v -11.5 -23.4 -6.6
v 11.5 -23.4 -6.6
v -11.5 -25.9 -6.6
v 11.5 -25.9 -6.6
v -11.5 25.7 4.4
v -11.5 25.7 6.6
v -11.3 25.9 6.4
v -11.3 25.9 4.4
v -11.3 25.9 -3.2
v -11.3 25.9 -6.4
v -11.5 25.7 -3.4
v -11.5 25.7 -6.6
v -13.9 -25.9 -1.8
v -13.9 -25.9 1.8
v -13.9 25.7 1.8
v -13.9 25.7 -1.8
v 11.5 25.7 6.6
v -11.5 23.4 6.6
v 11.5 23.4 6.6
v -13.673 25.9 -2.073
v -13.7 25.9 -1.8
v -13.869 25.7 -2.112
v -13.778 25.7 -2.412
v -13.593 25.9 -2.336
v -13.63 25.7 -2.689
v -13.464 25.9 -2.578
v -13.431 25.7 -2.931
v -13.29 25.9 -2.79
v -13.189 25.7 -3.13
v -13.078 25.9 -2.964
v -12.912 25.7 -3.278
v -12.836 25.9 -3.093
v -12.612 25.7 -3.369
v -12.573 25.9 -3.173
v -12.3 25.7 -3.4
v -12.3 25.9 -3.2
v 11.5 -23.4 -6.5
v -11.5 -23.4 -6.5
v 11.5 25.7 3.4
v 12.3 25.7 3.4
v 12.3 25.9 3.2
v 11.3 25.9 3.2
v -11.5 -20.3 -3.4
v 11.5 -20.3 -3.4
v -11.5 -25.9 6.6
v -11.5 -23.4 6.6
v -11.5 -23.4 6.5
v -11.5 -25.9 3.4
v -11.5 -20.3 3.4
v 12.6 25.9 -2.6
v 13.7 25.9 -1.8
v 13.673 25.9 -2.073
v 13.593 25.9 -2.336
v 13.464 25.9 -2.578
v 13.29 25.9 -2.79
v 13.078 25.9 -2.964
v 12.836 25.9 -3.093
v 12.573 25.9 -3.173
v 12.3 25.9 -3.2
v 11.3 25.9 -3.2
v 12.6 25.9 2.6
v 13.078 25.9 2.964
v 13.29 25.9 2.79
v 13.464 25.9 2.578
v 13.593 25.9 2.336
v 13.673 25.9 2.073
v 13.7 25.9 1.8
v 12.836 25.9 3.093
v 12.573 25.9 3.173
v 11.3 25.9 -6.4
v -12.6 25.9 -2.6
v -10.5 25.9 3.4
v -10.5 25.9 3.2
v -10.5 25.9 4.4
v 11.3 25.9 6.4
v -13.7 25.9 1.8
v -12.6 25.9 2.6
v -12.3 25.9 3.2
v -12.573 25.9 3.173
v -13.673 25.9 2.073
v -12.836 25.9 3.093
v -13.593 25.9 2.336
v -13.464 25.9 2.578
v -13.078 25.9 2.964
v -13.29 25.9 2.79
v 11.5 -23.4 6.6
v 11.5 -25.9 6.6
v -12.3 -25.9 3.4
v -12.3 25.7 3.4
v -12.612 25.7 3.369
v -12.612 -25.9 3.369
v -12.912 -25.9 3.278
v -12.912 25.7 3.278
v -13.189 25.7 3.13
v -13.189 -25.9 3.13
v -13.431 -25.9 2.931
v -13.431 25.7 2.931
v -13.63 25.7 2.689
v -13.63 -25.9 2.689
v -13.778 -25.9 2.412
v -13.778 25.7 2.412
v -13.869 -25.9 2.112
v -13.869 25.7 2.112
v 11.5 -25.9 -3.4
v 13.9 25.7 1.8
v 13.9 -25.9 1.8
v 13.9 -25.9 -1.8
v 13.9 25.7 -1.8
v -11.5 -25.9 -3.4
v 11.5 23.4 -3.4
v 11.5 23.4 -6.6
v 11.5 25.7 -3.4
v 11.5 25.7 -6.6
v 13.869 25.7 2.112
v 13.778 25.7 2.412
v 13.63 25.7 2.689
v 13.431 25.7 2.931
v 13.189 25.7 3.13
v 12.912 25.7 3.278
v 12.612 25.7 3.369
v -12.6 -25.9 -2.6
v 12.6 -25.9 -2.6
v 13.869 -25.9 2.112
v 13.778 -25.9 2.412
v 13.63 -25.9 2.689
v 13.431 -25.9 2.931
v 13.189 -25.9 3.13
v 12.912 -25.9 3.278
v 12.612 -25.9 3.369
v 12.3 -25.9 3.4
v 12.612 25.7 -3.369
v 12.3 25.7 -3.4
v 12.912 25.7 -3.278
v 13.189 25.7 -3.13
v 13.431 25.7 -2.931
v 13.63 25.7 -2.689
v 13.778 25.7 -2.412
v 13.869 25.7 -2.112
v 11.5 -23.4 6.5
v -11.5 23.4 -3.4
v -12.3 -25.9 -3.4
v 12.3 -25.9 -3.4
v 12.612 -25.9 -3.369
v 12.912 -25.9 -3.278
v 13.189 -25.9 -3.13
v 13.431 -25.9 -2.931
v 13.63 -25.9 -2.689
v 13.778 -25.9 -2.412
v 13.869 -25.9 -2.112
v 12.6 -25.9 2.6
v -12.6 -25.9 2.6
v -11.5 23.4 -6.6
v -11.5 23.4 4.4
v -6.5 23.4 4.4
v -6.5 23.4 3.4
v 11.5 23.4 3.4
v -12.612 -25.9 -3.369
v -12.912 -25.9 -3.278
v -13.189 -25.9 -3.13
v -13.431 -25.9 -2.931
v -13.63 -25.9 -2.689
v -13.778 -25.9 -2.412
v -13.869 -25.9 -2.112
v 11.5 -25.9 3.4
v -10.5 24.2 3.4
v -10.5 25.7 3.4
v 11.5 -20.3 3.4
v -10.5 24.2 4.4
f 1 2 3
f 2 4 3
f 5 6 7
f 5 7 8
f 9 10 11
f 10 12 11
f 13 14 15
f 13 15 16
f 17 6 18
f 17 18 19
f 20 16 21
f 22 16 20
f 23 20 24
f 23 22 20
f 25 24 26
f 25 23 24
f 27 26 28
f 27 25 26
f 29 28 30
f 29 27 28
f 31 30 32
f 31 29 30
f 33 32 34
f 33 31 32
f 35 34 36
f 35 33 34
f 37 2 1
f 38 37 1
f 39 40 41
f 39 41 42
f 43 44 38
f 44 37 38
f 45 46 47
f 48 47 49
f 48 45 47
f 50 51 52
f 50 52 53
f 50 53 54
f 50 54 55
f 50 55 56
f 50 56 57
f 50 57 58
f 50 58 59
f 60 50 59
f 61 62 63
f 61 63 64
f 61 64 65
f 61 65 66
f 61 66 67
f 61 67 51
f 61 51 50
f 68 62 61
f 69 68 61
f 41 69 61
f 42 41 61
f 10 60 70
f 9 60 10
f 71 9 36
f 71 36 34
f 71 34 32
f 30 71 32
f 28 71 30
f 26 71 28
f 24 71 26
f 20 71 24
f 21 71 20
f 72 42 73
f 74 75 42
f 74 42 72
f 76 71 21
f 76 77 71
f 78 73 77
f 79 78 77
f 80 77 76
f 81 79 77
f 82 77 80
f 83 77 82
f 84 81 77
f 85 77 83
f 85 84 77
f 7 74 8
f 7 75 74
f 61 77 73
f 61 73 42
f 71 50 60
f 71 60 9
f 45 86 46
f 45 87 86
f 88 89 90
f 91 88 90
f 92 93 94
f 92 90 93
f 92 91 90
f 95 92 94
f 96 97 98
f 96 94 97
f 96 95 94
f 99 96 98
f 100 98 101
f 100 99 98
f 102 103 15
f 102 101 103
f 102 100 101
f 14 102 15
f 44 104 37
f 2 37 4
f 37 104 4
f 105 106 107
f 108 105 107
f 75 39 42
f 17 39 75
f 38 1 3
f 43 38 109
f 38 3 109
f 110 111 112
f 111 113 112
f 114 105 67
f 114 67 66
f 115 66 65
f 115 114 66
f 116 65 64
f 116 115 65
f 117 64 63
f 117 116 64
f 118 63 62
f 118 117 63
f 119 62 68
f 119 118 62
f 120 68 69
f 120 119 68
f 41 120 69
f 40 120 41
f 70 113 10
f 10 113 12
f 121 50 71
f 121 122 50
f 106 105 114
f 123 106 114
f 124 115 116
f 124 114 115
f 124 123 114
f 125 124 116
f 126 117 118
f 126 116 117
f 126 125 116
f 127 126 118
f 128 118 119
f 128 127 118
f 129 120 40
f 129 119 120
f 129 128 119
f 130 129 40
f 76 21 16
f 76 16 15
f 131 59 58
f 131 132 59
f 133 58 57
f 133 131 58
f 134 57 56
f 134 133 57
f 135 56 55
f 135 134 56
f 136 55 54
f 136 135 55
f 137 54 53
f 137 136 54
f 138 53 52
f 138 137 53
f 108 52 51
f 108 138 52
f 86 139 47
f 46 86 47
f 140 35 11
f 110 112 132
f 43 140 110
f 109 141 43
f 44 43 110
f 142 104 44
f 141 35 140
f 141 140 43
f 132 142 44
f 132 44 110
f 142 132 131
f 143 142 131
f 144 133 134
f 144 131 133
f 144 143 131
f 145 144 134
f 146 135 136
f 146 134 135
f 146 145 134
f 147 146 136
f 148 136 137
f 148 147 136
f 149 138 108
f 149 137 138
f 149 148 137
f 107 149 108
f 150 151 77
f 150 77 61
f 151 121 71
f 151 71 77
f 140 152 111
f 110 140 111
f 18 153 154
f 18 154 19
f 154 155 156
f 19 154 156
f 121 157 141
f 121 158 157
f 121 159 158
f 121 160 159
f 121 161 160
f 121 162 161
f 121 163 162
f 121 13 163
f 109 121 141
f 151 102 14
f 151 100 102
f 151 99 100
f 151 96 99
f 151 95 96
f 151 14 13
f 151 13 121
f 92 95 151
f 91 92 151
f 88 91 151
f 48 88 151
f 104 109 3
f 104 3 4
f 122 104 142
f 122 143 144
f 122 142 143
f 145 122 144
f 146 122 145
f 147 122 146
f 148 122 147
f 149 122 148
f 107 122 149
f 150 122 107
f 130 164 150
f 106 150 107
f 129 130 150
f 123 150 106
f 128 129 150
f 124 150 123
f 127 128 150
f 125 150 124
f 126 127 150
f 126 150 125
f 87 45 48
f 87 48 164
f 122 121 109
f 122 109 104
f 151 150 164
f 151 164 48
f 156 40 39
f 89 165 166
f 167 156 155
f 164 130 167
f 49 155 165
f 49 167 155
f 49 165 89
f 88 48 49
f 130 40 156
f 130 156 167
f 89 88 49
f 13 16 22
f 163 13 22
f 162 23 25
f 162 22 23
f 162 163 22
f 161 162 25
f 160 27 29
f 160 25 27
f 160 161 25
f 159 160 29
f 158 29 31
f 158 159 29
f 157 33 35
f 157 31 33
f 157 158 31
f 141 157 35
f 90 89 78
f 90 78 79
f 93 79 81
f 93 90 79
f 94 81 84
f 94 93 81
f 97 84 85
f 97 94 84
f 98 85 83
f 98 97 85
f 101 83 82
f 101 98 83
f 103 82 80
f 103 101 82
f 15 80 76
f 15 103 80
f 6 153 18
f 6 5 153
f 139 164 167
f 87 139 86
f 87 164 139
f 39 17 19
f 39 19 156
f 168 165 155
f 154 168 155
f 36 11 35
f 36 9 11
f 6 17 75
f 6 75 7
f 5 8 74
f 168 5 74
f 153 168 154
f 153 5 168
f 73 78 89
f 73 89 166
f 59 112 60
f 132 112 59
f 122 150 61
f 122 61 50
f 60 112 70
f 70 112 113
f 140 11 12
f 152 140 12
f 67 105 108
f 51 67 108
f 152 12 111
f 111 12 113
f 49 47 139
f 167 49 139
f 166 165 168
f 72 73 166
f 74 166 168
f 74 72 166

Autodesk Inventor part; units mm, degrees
ref_plane "YZ Plane" through (0, 0, 0) normal (1, 0, 0) x (0, 1, 0)
ref_plane "XZ Plane" through (0, 0, 0) normal (0, 1, 0) x (-1, 0, 0)
ref_plane "XY Plane" through (0, 0, 0) normal (0, 0, 1) x (1, 0, 0)
sketch "Skizze2" plane through (0, 0, 0) normal (0, 1, 0) x (-1, 0, 0)
  line L0 (-12.6, -2.6) -> (12.6, -2.6)
  line L1 (12.6, -2.6) -> (12.6, 2.6)
  line L2 (12.6, 2.6) -> (-12.6, 2.6)
  line L3 (-12.6, 2.6) -> (-12.6, -2.6)
  line L4 (-12.6, -2.6) -> (12.6, 2.6) construction
  line L5 (12.6, -2.6) -> (-12.6, 2.6) construction
  line L6 (-12.3, 3.4) -> (12.3, 3.4)
  line L7 (12.3, -3.4) -> (-12.3, -3.4)
  line L8 (-19.9239, 0) -> (19.9239, 0) projected
  line L9 (0, -5.2239) -> (0, 5.2239) projected
  arc A0 (-12.3, 3.4) -> (-13.9, 1.8) centre (-12.3, 1.8) ccw
  arc A1 (-13.9, -1.8) -> (-12.3, -3.4) centre (-12.3, -1.8) ccw
  arc A2 (13.9, 1.8) -> (12.3, 3.4) centre (12.3, 1.8) ccw
  arc A3 (12.3, -3.4) -> (13.9, -1.8) centre (12.3, -1.8) ccw
  line L10 (-13.9, 1.8) -> (-13.9, -1.8)
  line L11 (13.9, 1.8) -> (13.9, -1.8)
  point P0 (0, 0)
  dimension "d0" = 25.2
  dimension "d1" = 5.2
  dimension "d2" = 0.8
  dimension "d29" = 3.2
  dimension "d32" = 1.3
extrude "Extrusion1" add sketch "Skizze2" along normal blind 25.9 contours L0 L9 L7 A1 L10 L8 L3 | L0 L1 L8 L11 A3 L7 L9 | L8 L10 A0 L6 L9 L2 L3 | L1 L2 L9 L6 A2 L11 L8
sketch "Skizze3" plane through (0, 25.9, 0) normal (0, 1, 0) x (1, 0, 0)
  line L0 (12.6, 2.6) -> (12.6, -2.6) projected
  line L1 (12.6, -2.6) -> (-12.6, -2.6) projected
  line L2 (-12.6, -2.6) -> (-12.6, 2.6) projected
  line L3 (-12.6, 2.6) -> (12.6, 2.6) projected
  line L4 (12.3, 3.4) -> (-12.3, 3.4) projected
  line L5 (-12.3, -3.4) -> (12.3, -3.4) projected
  line L6 (19.46, 0) -> (-19.46, 0) projected
  line L7 (11.5, -3.4) -> (-11.5, -3.4)
  line L8 (-11.5, -3.4) -> (-11.5, -6.6)
  line L9 (-11.5, -6.6) -> (11.5, -6.6)
  line L10 (11.5, -6.6) -> (11.5, -3.4)
  line L11 (12.3, 3.4) -> (-12.3, 3.4) projected
  line L12 (11.5, 3.4) -> (-11.5, 3.4)
  line L13 (-11.5, 3.4) -> (-11.5, 6.6)
  line L14 (-11.5, 6.6) -> (11.5, 6.6)
  line L15 (11.5, 6.6) -> (11.5, 3.4)
  line L16 (0, 9.24) -> (0, -9.24) projected
  line L17 (-12.3, -3.4) -> (12.3, -3.4) projected
  arc A0 (12.3, -3.4) -> (13.9, -1.8) centre (12.3, -1.8) ccw projected
  arc A1 (13.9, 1.8) -> (12.3, 3.4) centre (12.3, 1.8) ccw projected
  arc A2 (-12.3, 3.4) -> (-13.9, 1.8) centre (-12.3, 1.8) ccw projected
  arc A3 (-13.9, -1.8) -> (-12.3, -3.4) centre (-12.3, -1.8) ccw projected
  line L18 (13.9, -1.8) -> (13.9, 1.8) projected
  line L19 (-13.9, 1.8) -> (-13.9, -1.8) projected
  dimension "d18" = 3.2
  dimension "d19" = 23
extrude "Extrusion2" add sketch "Skizze3" against normal blind 2.5 contours L16 L14 L15 L4 | L4 L13 L14 L16 | L16 L9 L8 L5 | L5 L10 L9 L16
mirror "Spiegeln1" about plane through (0, 0, 0) normal (0, 1, 0) of "Extrusion1", "Extrusion2"
chamfer "Fase1" distance 3.1 angle 45 2 edges at (0, -23.4, 3.4) (0, -23.4, -3.4)
sketch "Skizze7" plane through (0, 23.4, 0) normal (0, -1, 0) x (1, 0, 0)
  line L0 (13.4387, -2.2) -> (13.6, -2.2) projected
  line L1 (13.6, 1.5) -> (13.6, 2.2) projected
  line L2 (13.6, 2.2) -> (13.4387, 2.2) projected
  line L3 (11.5, 3.4) -> (11.5, 6.6) projected
  line L4 (11.5, 6.6) -> (-11.5, 6.6) projected
  line L5 (-11.5, 6.6) -> (-11.5, 3.4) projected
  line L6 (11.5, 3.4) -> (-11.5, 3.4) projected
  line L7 (-11.5, -3.4) -> (11.5, -3.4) projected
  line L8 (-11.5, -3.4) -> (-11.5, -6.6) projected
  line L9 (-11.5, -6.6) -> (11.5, -6.6) projected
  line L10 (11.5, -6.6) -> (11.5, -3.4) projected
  line L11 (-13.6, -2.2) -> (-13.4387, -2.2) projected
  line L12 (-13.4387, 2.2) -> (-13.6, 2.2) projected
  line L13 (-13.6, -1.5) -> (-13.6, -2.2) projected
  line L14 (-13.6, 2.2) -> (-13.6, 1.5) projected
  arc A0 (-13.6, -1.5) -> (-13.4387, -2.2) centre (-12, -1.5) ccw projected
  arc A1 (-13.4387, 2.2) -> (-13.6, 1.5) centre (-12, 1.5) ccw projected
  arc A2 (13.4387, -2.2) -> (13.6, -1.5) centre (12, -1.5) ccw projected
  line L15 (13.6, -2.2) -> (13.6, -1.5) projected
  arc A3 (13.6, 1.5) -> (13.4387, 2.2) centre (12, 1.5) ccw projected
extrude "Extrusion4" [suppressed]
chamfer "Fase2" [suppressed]
sketch "Skizze8" plane through (-11.5, 23.4, 3.4) normal (0, 0, 1) x (1, 0, 0)
  line L0 (0, 2.5) -> (23, 2.5) projected
  line L1 (0, 2.5) -> (0, 0) projected
  line L2 (23, 0) -> (0, 0) projected
  line L3 (23, 2.5) -> (23, 0) projected
  line L4 (0, 0) -> (23, 0) projected
  line L5 (0, 0) -> (0, 1)
  line L6 (0, 1) -> (5, 0)
  line L7 (5, 0) -> (0, 0)
  point P0 (11.5, -23.4)
  dimension "d33" = 1
  dimension "d34" = 5
extrude "Extrusion5" cut sketch "Skizze8" along normal blind 1 contours L6 L2 L1
sketch "Skizze9" plane through (-11.5, 25.9, 3.4) normal (-1, 0, 0) x (0, 0, 1)
  line L0 (0, -1.5) -> (1, -1.5) projected
  line L1 (1, -1.5) -> (1, -2.5) projected
  line L2 (3.2, -2.5) -> (1, -2.5) projected
  line L3 (3.2, 0) -> (3.2, -2.5) projected
  line L4 (0, 0) -> (3.2, 0) projected
  line L5 (0, -1.5) -> (0, 0) projected
  line L6 (1, -2.5) -> (0, -2.5)
  line L7 (0, -2.5) -> (0, 0)
  line L8 (0, 0) -> (1, 0)
  line L9 (1, 0) -> (1, -2.5)
  point P0 (-3.4, -25.9)
extrude "Extrusion6" cut sketch "Skizze9" against normal blind 1 contours L5 L4 L9 L0 | L0 L1 L6 L7
chamfer "Fase3" distance 0.2 angle 45 16 edges at (0, 25.9, 6.6) (11.5, 25.9, 5) (13.4314, 25.9, 2.9314) (13.9, 25.9, 0) (13.4314, 25.9, -2.9314) (11.9, 25.9, -3.4) (11.9, 25.9, 3.4) (11.5, 25.9, -5) (0, 25.9, -6.6) (-11.5, 25.9, -5) (-11.9, 25.9, -3.4) (-13.4314, 25.9, -2.9314) (-13.9, 25.9, 0) (-13.4314, 25.9, 2.9314) (-11.4, 25.9, 3.4) (-11.5, 25.9, 5.5)
properties part number "Spulenkoerper" material "PC/ABS-Kunststoff"
